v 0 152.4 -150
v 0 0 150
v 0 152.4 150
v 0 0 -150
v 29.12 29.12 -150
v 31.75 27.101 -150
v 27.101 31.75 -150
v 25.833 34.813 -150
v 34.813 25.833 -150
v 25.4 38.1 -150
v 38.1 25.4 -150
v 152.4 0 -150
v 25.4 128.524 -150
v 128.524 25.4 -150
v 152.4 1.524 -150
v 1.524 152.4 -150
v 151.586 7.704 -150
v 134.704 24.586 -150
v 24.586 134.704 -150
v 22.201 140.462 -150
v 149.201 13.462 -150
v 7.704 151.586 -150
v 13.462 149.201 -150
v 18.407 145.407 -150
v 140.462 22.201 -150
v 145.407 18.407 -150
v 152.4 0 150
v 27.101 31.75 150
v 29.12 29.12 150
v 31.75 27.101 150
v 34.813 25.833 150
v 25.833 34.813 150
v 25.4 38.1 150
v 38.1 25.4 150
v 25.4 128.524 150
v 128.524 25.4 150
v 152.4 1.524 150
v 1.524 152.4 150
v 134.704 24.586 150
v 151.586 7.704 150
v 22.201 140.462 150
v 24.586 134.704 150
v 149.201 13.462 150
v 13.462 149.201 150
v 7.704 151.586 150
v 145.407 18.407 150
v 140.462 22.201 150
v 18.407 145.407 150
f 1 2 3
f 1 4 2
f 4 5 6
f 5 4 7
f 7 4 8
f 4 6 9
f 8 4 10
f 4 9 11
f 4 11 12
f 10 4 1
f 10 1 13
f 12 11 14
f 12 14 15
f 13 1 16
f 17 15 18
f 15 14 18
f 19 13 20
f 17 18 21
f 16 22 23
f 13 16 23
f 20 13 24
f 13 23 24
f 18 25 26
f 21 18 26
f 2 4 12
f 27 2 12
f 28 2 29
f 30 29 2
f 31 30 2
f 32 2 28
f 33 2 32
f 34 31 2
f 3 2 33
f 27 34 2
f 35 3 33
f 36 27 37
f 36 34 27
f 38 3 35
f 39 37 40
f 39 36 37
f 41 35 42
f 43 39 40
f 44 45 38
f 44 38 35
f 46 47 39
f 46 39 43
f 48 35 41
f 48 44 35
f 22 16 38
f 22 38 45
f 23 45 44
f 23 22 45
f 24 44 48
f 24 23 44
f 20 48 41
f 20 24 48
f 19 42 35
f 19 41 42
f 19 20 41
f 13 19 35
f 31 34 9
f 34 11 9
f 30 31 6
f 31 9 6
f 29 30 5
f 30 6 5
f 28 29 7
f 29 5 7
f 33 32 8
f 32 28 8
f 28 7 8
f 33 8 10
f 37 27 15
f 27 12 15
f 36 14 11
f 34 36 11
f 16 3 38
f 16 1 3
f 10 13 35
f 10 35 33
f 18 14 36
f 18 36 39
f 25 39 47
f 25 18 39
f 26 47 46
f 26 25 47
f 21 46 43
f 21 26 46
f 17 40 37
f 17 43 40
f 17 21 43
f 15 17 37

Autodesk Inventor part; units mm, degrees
ref_plane "YZ Plane" through (0, 0, 0) normal (1, 0, 0) x (0, 1, 0)
ref_plane "XZ Plane" through (0, 0, 0) normal (0, 1, 0) x (-1, 0, 0)
ref_plane "XY Plane" through (0, 0, 0) normal (0, 0, 1) x (1, 0, 0)
sketch "Sketch1" plane through (0, 0, 0) normal (0, 0, 1) x (1, 0, 0)
  line L0 (0, 0) -> (0, 152.4)
  line L1 (0, 152.4) -> (1.524, 152.4)
  line L2 (25.4, 128.524) -> (25.4, 38.1)
  line L3 (0, 0) -> (152.4, 0)
  line L4 (152.4, 0) -> (152.4, 1.524)
  line L5 (128.524, 25.4) -> (38.1, 25.4)
  arc A0 (25.4, 38.1) -> (38.1, 25.4) centre (38.1, 38.1) ccw
  arc A1 (25.4, 128.524) -> (1.524, 152.4) centre (1.524, 128.524) ccw
  arc A2 (152.4, 1.524) -> (128.524, 25.4) centre (128.524, 1.524) ccw
  line L6 (0, 188.8139) -> (0, -31.469) projected
  line L7 (-31.469, 0) -> (188.8139, 0) projected
  point P0 (0, 0)
  dimension "thickness" = 25.4
  dimension "d3" = 25.4
  dimension "LegSize" = 152.4
  dimension "d5" = 152.4
  dimension "radius" = 12.7
  dimension "d7" = 23.876
  dimension "d8" = 23.876
  dimension "d11" = 0
  dimension "d12" = 0
extrude "6\" X 6\" X 1\"" add sketch "Sketch1" along normal mid plane 300
equation "\"d3\" = thickness"
equation "\"d5\" = LegSize"
properties part number "ANGLE IRON, 6 X 6 X 1 THK" material "Angle Iron"
